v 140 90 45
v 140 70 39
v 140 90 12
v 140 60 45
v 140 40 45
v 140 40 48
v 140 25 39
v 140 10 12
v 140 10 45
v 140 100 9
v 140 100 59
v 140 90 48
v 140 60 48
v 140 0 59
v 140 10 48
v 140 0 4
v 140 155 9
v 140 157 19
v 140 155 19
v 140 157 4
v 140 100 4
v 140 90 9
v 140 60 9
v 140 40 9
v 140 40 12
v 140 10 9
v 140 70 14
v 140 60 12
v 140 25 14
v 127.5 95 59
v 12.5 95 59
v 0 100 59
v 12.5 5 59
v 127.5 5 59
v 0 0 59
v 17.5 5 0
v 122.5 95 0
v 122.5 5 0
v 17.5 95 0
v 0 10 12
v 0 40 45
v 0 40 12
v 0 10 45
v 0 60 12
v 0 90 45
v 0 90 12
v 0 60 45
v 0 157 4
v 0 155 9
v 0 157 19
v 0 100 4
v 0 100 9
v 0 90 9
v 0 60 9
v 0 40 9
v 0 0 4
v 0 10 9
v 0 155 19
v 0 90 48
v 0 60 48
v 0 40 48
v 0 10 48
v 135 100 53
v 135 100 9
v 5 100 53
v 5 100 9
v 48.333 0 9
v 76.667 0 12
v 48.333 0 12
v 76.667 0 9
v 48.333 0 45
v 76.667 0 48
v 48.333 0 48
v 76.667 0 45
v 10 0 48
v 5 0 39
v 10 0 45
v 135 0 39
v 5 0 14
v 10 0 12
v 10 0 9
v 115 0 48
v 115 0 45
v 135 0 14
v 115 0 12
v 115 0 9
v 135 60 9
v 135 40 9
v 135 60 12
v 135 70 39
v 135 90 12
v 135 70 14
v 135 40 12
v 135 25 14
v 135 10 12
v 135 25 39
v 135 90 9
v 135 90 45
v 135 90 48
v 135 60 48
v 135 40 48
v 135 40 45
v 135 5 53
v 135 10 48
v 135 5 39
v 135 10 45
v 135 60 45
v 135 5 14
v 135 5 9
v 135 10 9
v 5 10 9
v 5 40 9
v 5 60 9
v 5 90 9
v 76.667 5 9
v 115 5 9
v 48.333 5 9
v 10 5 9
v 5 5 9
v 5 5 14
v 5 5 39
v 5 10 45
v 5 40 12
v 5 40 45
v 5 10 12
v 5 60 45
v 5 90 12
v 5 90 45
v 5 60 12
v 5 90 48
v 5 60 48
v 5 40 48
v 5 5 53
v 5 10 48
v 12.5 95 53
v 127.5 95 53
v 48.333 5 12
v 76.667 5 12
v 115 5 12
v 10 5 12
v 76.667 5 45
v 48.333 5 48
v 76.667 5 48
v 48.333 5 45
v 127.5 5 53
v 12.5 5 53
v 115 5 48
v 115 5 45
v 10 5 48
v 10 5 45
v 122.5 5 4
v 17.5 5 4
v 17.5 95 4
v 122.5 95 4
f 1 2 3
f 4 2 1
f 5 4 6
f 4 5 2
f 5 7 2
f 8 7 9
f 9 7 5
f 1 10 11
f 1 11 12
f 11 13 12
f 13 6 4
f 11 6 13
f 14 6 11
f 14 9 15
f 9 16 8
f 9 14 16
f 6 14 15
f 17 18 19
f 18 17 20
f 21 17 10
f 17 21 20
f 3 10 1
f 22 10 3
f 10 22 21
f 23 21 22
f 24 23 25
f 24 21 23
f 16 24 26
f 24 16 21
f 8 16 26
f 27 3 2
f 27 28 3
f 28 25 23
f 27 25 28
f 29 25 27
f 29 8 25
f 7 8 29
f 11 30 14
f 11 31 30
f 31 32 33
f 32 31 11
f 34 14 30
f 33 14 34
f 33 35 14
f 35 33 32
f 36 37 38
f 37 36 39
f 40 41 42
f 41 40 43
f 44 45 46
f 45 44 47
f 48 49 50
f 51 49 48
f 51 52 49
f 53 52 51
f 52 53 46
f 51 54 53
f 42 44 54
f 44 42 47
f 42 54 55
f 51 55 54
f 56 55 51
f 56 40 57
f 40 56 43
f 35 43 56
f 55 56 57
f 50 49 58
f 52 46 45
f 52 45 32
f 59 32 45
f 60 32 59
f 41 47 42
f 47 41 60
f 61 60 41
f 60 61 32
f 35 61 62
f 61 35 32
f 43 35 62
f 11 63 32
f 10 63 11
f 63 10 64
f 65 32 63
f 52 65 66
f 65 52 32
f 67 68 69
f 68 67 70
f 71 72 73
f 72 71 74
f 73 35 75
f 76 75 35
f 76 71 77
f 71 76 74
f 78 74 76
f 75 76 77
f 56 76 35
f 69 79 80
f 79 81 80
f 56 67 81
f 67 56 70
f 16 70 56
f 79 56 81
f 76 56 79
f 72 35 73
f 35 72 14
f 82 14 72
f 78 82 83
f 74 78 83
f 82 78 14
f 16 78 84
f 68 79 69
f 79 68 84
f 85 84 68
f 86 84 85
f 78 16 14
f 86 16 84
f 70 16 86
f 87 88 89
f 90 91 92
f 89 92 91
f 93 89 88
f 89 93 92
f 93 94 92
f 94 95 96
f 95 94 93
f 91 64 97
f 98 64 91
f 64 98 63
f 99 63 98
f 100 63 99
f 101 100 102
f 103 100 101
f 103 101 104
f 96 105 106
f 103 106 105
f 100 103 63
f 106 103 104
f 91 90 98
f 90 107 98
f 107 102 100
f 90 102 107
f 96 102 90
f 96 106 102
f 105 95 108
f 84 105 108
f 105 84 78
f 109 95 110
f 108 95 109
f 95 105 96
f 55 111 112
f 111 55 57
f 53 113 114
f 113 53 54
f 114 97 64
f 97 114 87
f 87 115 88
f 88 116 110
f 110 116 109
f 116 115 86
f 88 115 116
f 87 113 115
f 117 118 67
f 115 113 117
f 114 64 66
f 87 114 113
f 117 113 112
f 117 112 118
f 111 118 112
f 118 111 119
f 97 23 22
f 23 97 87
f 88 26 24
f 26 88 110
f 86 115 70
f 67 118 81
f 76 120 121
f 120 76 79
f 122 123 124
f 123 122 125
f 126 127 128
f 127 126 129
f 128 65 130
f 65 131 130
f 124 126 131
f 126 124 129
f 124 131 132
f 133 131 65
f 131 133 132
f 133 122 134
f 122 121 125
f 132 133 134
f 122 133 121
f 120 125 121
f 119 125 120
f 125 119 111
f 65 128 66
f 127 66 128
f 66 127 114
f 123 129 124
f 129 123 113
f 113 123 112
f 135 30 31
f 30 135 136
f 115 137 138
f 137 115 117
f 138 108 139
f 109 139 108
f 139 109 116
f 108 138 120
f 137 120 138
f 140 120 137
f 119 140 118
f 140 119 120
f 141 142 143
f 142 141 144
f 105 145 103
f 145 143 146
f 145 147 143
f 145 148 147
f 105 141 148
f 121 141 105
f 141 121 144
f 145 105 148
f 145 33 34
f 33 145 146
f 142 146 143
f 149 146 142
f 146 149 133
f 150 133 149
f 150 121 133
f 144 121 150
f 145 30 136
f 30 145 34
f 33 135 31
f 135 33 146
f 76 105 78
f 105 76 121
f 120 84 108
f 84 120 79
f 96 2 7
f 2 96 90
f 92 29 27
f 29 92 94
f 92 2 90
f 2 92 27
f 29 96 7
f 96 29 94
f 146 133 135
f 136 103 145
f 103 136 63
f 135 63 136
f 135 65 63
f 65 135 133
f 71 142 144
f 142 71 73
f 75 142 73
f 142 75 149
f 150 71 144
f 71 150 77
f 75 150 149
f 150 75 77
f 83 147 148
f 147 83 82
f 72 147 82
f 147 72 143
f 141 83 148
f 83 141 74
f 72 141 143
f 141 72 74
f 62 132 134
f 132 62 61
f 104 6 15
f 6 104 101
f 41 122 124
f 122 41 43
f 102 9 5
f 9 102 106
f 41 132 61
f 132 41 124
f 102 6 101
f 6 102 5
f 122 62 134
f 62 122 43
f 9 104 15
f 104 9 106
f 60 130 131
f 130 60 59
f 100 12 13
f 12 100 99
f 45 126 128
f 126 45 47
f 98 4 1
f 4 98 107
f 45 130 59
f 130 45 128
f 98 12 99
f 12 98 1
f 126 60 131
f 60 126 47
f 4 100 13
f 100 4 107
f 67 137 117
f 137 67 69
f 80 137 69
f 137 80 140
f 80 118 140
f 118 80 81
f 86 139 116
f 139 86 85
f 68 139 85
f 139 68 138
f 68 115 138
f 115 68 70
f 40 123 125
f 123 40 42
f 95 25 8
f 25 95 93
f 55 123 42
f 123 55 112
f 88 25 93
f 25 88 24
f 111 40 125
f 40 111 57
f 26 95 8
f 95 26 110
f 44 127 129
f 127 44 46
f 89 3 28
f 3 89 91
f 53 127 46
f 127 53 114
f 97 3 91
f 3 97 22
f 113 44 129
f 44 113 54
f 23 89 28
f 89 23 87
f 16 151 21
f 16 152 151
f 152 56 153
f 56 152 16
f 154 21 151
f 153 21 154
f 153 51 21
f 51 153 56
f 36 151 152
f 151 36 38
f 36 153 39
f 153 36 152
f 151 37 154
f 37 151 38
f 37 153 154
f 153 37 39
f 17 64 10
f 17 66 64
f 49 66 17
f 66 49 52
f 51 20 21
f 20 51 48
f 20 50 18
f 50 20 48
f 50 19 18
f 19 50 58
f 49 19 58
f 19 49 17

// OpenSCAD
// file: hEX-hAP-Vars.scad
InnerW=115;
InnerD=90;
LipH=4;
Wall=5;
TabX=20;

DW=Wall*2;
TW=Wall*3;
OuterW=InnerW+DW;
OuterD=InnerD+DW;
Buff=1;
DB=Buff*2;
BackStopWall=2;
// main file
include <hEX-hAP-Vars.scad>;

InnerH=35;
InnerSW=130;
OuterSW=InnerSW+DW;
Front=25;
DevFeet=5;
SideCutH=25;
SideCutD=45;
SideCutPosD=25;
SideCutPosH=5;
VentH=3;

BoxFloor=LipH+Wall;
OuterH=LipH+InnerH+DW+DW;
TopVentH=BoxFloor+InnerH+Buff;
BottomVentH=BoxFloor;
LipXwidth=InnerSW-InnerW-(Wall/2);
ExtraBack=55;


difference()
{
  cube([OuterSW,OuterD,OuterH]);
  //Main inner Cut
  translate([Wall,Wall,BoxFloor]) cube([InnerSW,InnerD,InnerH]); 
  //top Cut
  translate([LipXwidth,Wall,BoxFloor]) cube([InnerW,InnerD,OuterH]); 

  //Front cut
  translate([Wall,-Buff,BoxFloor+DevFeet]) cube([InnerSW,DW,Front]);
  //Side Cut
  translate([InnerSW+Wall-Buff,SideCutPosD,BoxFloor+SideCutPosH]) cube([Wall+DB,SideCutD,SideCutH]); 
  //Back Cut
  translate([Wall,Wall,BoxFloor]) cube([InnerSW,OuterD,OuterH-TW]);

  
  // Top vents  
  translate([DW,-Buff,TopVentH]) cube([InnerW/3,OuterD+DB,VentH]);
  translate([((InnerW/3)*2),-Buff,TopVentH]) cube([InnerW/3,OuterD+DB,VentH]);
  translate([-Buff,DW,TopVentH]) cube([OuterSW+DB,InnerD/3,VentH]);
  translate([-Buff,((InnerD/3)*2),TopVentH]) cube([OuterSW+DB,InnerD/3,VentH]);
  
  // Bottom vents  
  translate([DW,-Buff,BottomVentH]) cube([InnerW/3,OuterD+DB,VentH]);
  translate([((InnerW/3)*2),-Buff,BottomVentH]) cube([InnerW/3,OuterD+DB,VentH]);
  translate([-Buff,DW,BottomVentH]) cube([OuterSW+DB,InnerD/3,VentH]);
  translate([-Buff,((InnerD/3)*2),BottomVentH]) cube([OuterSW+DB,InnerD/3,VentH]);
  
  //Stacking lip
  translate([-Buff,-Buff,-Buff]) cube([OuterSW+DB+Buff,Wall+Buff,LipH+Buff]);
  translate([-Buff,-Buff,-Buff]) cube([LipXwidth+Wall+Buff,OuterD+DB,LipH+Buff]);
  translate([OuterW-(Wall/2),-Buff,-Buff]) cube([LipXwidth+Wall+Buff,OuterD+Buff,LipH+Buff]);
  translate([-Buff,OuterD-Wall,-Buff]) cube([OuterSW+DB+Buff,Wall+DB+Buff,LipH+Buff]);
}
translate([0,OuterD,LipH]) cube([OuterSW,BackStopWall+ExtraBack,Wall]);
translate([0,OuterD+ExtraBack,BoxFloor]) cube([OuterSW,BackStopWall,DW]);
